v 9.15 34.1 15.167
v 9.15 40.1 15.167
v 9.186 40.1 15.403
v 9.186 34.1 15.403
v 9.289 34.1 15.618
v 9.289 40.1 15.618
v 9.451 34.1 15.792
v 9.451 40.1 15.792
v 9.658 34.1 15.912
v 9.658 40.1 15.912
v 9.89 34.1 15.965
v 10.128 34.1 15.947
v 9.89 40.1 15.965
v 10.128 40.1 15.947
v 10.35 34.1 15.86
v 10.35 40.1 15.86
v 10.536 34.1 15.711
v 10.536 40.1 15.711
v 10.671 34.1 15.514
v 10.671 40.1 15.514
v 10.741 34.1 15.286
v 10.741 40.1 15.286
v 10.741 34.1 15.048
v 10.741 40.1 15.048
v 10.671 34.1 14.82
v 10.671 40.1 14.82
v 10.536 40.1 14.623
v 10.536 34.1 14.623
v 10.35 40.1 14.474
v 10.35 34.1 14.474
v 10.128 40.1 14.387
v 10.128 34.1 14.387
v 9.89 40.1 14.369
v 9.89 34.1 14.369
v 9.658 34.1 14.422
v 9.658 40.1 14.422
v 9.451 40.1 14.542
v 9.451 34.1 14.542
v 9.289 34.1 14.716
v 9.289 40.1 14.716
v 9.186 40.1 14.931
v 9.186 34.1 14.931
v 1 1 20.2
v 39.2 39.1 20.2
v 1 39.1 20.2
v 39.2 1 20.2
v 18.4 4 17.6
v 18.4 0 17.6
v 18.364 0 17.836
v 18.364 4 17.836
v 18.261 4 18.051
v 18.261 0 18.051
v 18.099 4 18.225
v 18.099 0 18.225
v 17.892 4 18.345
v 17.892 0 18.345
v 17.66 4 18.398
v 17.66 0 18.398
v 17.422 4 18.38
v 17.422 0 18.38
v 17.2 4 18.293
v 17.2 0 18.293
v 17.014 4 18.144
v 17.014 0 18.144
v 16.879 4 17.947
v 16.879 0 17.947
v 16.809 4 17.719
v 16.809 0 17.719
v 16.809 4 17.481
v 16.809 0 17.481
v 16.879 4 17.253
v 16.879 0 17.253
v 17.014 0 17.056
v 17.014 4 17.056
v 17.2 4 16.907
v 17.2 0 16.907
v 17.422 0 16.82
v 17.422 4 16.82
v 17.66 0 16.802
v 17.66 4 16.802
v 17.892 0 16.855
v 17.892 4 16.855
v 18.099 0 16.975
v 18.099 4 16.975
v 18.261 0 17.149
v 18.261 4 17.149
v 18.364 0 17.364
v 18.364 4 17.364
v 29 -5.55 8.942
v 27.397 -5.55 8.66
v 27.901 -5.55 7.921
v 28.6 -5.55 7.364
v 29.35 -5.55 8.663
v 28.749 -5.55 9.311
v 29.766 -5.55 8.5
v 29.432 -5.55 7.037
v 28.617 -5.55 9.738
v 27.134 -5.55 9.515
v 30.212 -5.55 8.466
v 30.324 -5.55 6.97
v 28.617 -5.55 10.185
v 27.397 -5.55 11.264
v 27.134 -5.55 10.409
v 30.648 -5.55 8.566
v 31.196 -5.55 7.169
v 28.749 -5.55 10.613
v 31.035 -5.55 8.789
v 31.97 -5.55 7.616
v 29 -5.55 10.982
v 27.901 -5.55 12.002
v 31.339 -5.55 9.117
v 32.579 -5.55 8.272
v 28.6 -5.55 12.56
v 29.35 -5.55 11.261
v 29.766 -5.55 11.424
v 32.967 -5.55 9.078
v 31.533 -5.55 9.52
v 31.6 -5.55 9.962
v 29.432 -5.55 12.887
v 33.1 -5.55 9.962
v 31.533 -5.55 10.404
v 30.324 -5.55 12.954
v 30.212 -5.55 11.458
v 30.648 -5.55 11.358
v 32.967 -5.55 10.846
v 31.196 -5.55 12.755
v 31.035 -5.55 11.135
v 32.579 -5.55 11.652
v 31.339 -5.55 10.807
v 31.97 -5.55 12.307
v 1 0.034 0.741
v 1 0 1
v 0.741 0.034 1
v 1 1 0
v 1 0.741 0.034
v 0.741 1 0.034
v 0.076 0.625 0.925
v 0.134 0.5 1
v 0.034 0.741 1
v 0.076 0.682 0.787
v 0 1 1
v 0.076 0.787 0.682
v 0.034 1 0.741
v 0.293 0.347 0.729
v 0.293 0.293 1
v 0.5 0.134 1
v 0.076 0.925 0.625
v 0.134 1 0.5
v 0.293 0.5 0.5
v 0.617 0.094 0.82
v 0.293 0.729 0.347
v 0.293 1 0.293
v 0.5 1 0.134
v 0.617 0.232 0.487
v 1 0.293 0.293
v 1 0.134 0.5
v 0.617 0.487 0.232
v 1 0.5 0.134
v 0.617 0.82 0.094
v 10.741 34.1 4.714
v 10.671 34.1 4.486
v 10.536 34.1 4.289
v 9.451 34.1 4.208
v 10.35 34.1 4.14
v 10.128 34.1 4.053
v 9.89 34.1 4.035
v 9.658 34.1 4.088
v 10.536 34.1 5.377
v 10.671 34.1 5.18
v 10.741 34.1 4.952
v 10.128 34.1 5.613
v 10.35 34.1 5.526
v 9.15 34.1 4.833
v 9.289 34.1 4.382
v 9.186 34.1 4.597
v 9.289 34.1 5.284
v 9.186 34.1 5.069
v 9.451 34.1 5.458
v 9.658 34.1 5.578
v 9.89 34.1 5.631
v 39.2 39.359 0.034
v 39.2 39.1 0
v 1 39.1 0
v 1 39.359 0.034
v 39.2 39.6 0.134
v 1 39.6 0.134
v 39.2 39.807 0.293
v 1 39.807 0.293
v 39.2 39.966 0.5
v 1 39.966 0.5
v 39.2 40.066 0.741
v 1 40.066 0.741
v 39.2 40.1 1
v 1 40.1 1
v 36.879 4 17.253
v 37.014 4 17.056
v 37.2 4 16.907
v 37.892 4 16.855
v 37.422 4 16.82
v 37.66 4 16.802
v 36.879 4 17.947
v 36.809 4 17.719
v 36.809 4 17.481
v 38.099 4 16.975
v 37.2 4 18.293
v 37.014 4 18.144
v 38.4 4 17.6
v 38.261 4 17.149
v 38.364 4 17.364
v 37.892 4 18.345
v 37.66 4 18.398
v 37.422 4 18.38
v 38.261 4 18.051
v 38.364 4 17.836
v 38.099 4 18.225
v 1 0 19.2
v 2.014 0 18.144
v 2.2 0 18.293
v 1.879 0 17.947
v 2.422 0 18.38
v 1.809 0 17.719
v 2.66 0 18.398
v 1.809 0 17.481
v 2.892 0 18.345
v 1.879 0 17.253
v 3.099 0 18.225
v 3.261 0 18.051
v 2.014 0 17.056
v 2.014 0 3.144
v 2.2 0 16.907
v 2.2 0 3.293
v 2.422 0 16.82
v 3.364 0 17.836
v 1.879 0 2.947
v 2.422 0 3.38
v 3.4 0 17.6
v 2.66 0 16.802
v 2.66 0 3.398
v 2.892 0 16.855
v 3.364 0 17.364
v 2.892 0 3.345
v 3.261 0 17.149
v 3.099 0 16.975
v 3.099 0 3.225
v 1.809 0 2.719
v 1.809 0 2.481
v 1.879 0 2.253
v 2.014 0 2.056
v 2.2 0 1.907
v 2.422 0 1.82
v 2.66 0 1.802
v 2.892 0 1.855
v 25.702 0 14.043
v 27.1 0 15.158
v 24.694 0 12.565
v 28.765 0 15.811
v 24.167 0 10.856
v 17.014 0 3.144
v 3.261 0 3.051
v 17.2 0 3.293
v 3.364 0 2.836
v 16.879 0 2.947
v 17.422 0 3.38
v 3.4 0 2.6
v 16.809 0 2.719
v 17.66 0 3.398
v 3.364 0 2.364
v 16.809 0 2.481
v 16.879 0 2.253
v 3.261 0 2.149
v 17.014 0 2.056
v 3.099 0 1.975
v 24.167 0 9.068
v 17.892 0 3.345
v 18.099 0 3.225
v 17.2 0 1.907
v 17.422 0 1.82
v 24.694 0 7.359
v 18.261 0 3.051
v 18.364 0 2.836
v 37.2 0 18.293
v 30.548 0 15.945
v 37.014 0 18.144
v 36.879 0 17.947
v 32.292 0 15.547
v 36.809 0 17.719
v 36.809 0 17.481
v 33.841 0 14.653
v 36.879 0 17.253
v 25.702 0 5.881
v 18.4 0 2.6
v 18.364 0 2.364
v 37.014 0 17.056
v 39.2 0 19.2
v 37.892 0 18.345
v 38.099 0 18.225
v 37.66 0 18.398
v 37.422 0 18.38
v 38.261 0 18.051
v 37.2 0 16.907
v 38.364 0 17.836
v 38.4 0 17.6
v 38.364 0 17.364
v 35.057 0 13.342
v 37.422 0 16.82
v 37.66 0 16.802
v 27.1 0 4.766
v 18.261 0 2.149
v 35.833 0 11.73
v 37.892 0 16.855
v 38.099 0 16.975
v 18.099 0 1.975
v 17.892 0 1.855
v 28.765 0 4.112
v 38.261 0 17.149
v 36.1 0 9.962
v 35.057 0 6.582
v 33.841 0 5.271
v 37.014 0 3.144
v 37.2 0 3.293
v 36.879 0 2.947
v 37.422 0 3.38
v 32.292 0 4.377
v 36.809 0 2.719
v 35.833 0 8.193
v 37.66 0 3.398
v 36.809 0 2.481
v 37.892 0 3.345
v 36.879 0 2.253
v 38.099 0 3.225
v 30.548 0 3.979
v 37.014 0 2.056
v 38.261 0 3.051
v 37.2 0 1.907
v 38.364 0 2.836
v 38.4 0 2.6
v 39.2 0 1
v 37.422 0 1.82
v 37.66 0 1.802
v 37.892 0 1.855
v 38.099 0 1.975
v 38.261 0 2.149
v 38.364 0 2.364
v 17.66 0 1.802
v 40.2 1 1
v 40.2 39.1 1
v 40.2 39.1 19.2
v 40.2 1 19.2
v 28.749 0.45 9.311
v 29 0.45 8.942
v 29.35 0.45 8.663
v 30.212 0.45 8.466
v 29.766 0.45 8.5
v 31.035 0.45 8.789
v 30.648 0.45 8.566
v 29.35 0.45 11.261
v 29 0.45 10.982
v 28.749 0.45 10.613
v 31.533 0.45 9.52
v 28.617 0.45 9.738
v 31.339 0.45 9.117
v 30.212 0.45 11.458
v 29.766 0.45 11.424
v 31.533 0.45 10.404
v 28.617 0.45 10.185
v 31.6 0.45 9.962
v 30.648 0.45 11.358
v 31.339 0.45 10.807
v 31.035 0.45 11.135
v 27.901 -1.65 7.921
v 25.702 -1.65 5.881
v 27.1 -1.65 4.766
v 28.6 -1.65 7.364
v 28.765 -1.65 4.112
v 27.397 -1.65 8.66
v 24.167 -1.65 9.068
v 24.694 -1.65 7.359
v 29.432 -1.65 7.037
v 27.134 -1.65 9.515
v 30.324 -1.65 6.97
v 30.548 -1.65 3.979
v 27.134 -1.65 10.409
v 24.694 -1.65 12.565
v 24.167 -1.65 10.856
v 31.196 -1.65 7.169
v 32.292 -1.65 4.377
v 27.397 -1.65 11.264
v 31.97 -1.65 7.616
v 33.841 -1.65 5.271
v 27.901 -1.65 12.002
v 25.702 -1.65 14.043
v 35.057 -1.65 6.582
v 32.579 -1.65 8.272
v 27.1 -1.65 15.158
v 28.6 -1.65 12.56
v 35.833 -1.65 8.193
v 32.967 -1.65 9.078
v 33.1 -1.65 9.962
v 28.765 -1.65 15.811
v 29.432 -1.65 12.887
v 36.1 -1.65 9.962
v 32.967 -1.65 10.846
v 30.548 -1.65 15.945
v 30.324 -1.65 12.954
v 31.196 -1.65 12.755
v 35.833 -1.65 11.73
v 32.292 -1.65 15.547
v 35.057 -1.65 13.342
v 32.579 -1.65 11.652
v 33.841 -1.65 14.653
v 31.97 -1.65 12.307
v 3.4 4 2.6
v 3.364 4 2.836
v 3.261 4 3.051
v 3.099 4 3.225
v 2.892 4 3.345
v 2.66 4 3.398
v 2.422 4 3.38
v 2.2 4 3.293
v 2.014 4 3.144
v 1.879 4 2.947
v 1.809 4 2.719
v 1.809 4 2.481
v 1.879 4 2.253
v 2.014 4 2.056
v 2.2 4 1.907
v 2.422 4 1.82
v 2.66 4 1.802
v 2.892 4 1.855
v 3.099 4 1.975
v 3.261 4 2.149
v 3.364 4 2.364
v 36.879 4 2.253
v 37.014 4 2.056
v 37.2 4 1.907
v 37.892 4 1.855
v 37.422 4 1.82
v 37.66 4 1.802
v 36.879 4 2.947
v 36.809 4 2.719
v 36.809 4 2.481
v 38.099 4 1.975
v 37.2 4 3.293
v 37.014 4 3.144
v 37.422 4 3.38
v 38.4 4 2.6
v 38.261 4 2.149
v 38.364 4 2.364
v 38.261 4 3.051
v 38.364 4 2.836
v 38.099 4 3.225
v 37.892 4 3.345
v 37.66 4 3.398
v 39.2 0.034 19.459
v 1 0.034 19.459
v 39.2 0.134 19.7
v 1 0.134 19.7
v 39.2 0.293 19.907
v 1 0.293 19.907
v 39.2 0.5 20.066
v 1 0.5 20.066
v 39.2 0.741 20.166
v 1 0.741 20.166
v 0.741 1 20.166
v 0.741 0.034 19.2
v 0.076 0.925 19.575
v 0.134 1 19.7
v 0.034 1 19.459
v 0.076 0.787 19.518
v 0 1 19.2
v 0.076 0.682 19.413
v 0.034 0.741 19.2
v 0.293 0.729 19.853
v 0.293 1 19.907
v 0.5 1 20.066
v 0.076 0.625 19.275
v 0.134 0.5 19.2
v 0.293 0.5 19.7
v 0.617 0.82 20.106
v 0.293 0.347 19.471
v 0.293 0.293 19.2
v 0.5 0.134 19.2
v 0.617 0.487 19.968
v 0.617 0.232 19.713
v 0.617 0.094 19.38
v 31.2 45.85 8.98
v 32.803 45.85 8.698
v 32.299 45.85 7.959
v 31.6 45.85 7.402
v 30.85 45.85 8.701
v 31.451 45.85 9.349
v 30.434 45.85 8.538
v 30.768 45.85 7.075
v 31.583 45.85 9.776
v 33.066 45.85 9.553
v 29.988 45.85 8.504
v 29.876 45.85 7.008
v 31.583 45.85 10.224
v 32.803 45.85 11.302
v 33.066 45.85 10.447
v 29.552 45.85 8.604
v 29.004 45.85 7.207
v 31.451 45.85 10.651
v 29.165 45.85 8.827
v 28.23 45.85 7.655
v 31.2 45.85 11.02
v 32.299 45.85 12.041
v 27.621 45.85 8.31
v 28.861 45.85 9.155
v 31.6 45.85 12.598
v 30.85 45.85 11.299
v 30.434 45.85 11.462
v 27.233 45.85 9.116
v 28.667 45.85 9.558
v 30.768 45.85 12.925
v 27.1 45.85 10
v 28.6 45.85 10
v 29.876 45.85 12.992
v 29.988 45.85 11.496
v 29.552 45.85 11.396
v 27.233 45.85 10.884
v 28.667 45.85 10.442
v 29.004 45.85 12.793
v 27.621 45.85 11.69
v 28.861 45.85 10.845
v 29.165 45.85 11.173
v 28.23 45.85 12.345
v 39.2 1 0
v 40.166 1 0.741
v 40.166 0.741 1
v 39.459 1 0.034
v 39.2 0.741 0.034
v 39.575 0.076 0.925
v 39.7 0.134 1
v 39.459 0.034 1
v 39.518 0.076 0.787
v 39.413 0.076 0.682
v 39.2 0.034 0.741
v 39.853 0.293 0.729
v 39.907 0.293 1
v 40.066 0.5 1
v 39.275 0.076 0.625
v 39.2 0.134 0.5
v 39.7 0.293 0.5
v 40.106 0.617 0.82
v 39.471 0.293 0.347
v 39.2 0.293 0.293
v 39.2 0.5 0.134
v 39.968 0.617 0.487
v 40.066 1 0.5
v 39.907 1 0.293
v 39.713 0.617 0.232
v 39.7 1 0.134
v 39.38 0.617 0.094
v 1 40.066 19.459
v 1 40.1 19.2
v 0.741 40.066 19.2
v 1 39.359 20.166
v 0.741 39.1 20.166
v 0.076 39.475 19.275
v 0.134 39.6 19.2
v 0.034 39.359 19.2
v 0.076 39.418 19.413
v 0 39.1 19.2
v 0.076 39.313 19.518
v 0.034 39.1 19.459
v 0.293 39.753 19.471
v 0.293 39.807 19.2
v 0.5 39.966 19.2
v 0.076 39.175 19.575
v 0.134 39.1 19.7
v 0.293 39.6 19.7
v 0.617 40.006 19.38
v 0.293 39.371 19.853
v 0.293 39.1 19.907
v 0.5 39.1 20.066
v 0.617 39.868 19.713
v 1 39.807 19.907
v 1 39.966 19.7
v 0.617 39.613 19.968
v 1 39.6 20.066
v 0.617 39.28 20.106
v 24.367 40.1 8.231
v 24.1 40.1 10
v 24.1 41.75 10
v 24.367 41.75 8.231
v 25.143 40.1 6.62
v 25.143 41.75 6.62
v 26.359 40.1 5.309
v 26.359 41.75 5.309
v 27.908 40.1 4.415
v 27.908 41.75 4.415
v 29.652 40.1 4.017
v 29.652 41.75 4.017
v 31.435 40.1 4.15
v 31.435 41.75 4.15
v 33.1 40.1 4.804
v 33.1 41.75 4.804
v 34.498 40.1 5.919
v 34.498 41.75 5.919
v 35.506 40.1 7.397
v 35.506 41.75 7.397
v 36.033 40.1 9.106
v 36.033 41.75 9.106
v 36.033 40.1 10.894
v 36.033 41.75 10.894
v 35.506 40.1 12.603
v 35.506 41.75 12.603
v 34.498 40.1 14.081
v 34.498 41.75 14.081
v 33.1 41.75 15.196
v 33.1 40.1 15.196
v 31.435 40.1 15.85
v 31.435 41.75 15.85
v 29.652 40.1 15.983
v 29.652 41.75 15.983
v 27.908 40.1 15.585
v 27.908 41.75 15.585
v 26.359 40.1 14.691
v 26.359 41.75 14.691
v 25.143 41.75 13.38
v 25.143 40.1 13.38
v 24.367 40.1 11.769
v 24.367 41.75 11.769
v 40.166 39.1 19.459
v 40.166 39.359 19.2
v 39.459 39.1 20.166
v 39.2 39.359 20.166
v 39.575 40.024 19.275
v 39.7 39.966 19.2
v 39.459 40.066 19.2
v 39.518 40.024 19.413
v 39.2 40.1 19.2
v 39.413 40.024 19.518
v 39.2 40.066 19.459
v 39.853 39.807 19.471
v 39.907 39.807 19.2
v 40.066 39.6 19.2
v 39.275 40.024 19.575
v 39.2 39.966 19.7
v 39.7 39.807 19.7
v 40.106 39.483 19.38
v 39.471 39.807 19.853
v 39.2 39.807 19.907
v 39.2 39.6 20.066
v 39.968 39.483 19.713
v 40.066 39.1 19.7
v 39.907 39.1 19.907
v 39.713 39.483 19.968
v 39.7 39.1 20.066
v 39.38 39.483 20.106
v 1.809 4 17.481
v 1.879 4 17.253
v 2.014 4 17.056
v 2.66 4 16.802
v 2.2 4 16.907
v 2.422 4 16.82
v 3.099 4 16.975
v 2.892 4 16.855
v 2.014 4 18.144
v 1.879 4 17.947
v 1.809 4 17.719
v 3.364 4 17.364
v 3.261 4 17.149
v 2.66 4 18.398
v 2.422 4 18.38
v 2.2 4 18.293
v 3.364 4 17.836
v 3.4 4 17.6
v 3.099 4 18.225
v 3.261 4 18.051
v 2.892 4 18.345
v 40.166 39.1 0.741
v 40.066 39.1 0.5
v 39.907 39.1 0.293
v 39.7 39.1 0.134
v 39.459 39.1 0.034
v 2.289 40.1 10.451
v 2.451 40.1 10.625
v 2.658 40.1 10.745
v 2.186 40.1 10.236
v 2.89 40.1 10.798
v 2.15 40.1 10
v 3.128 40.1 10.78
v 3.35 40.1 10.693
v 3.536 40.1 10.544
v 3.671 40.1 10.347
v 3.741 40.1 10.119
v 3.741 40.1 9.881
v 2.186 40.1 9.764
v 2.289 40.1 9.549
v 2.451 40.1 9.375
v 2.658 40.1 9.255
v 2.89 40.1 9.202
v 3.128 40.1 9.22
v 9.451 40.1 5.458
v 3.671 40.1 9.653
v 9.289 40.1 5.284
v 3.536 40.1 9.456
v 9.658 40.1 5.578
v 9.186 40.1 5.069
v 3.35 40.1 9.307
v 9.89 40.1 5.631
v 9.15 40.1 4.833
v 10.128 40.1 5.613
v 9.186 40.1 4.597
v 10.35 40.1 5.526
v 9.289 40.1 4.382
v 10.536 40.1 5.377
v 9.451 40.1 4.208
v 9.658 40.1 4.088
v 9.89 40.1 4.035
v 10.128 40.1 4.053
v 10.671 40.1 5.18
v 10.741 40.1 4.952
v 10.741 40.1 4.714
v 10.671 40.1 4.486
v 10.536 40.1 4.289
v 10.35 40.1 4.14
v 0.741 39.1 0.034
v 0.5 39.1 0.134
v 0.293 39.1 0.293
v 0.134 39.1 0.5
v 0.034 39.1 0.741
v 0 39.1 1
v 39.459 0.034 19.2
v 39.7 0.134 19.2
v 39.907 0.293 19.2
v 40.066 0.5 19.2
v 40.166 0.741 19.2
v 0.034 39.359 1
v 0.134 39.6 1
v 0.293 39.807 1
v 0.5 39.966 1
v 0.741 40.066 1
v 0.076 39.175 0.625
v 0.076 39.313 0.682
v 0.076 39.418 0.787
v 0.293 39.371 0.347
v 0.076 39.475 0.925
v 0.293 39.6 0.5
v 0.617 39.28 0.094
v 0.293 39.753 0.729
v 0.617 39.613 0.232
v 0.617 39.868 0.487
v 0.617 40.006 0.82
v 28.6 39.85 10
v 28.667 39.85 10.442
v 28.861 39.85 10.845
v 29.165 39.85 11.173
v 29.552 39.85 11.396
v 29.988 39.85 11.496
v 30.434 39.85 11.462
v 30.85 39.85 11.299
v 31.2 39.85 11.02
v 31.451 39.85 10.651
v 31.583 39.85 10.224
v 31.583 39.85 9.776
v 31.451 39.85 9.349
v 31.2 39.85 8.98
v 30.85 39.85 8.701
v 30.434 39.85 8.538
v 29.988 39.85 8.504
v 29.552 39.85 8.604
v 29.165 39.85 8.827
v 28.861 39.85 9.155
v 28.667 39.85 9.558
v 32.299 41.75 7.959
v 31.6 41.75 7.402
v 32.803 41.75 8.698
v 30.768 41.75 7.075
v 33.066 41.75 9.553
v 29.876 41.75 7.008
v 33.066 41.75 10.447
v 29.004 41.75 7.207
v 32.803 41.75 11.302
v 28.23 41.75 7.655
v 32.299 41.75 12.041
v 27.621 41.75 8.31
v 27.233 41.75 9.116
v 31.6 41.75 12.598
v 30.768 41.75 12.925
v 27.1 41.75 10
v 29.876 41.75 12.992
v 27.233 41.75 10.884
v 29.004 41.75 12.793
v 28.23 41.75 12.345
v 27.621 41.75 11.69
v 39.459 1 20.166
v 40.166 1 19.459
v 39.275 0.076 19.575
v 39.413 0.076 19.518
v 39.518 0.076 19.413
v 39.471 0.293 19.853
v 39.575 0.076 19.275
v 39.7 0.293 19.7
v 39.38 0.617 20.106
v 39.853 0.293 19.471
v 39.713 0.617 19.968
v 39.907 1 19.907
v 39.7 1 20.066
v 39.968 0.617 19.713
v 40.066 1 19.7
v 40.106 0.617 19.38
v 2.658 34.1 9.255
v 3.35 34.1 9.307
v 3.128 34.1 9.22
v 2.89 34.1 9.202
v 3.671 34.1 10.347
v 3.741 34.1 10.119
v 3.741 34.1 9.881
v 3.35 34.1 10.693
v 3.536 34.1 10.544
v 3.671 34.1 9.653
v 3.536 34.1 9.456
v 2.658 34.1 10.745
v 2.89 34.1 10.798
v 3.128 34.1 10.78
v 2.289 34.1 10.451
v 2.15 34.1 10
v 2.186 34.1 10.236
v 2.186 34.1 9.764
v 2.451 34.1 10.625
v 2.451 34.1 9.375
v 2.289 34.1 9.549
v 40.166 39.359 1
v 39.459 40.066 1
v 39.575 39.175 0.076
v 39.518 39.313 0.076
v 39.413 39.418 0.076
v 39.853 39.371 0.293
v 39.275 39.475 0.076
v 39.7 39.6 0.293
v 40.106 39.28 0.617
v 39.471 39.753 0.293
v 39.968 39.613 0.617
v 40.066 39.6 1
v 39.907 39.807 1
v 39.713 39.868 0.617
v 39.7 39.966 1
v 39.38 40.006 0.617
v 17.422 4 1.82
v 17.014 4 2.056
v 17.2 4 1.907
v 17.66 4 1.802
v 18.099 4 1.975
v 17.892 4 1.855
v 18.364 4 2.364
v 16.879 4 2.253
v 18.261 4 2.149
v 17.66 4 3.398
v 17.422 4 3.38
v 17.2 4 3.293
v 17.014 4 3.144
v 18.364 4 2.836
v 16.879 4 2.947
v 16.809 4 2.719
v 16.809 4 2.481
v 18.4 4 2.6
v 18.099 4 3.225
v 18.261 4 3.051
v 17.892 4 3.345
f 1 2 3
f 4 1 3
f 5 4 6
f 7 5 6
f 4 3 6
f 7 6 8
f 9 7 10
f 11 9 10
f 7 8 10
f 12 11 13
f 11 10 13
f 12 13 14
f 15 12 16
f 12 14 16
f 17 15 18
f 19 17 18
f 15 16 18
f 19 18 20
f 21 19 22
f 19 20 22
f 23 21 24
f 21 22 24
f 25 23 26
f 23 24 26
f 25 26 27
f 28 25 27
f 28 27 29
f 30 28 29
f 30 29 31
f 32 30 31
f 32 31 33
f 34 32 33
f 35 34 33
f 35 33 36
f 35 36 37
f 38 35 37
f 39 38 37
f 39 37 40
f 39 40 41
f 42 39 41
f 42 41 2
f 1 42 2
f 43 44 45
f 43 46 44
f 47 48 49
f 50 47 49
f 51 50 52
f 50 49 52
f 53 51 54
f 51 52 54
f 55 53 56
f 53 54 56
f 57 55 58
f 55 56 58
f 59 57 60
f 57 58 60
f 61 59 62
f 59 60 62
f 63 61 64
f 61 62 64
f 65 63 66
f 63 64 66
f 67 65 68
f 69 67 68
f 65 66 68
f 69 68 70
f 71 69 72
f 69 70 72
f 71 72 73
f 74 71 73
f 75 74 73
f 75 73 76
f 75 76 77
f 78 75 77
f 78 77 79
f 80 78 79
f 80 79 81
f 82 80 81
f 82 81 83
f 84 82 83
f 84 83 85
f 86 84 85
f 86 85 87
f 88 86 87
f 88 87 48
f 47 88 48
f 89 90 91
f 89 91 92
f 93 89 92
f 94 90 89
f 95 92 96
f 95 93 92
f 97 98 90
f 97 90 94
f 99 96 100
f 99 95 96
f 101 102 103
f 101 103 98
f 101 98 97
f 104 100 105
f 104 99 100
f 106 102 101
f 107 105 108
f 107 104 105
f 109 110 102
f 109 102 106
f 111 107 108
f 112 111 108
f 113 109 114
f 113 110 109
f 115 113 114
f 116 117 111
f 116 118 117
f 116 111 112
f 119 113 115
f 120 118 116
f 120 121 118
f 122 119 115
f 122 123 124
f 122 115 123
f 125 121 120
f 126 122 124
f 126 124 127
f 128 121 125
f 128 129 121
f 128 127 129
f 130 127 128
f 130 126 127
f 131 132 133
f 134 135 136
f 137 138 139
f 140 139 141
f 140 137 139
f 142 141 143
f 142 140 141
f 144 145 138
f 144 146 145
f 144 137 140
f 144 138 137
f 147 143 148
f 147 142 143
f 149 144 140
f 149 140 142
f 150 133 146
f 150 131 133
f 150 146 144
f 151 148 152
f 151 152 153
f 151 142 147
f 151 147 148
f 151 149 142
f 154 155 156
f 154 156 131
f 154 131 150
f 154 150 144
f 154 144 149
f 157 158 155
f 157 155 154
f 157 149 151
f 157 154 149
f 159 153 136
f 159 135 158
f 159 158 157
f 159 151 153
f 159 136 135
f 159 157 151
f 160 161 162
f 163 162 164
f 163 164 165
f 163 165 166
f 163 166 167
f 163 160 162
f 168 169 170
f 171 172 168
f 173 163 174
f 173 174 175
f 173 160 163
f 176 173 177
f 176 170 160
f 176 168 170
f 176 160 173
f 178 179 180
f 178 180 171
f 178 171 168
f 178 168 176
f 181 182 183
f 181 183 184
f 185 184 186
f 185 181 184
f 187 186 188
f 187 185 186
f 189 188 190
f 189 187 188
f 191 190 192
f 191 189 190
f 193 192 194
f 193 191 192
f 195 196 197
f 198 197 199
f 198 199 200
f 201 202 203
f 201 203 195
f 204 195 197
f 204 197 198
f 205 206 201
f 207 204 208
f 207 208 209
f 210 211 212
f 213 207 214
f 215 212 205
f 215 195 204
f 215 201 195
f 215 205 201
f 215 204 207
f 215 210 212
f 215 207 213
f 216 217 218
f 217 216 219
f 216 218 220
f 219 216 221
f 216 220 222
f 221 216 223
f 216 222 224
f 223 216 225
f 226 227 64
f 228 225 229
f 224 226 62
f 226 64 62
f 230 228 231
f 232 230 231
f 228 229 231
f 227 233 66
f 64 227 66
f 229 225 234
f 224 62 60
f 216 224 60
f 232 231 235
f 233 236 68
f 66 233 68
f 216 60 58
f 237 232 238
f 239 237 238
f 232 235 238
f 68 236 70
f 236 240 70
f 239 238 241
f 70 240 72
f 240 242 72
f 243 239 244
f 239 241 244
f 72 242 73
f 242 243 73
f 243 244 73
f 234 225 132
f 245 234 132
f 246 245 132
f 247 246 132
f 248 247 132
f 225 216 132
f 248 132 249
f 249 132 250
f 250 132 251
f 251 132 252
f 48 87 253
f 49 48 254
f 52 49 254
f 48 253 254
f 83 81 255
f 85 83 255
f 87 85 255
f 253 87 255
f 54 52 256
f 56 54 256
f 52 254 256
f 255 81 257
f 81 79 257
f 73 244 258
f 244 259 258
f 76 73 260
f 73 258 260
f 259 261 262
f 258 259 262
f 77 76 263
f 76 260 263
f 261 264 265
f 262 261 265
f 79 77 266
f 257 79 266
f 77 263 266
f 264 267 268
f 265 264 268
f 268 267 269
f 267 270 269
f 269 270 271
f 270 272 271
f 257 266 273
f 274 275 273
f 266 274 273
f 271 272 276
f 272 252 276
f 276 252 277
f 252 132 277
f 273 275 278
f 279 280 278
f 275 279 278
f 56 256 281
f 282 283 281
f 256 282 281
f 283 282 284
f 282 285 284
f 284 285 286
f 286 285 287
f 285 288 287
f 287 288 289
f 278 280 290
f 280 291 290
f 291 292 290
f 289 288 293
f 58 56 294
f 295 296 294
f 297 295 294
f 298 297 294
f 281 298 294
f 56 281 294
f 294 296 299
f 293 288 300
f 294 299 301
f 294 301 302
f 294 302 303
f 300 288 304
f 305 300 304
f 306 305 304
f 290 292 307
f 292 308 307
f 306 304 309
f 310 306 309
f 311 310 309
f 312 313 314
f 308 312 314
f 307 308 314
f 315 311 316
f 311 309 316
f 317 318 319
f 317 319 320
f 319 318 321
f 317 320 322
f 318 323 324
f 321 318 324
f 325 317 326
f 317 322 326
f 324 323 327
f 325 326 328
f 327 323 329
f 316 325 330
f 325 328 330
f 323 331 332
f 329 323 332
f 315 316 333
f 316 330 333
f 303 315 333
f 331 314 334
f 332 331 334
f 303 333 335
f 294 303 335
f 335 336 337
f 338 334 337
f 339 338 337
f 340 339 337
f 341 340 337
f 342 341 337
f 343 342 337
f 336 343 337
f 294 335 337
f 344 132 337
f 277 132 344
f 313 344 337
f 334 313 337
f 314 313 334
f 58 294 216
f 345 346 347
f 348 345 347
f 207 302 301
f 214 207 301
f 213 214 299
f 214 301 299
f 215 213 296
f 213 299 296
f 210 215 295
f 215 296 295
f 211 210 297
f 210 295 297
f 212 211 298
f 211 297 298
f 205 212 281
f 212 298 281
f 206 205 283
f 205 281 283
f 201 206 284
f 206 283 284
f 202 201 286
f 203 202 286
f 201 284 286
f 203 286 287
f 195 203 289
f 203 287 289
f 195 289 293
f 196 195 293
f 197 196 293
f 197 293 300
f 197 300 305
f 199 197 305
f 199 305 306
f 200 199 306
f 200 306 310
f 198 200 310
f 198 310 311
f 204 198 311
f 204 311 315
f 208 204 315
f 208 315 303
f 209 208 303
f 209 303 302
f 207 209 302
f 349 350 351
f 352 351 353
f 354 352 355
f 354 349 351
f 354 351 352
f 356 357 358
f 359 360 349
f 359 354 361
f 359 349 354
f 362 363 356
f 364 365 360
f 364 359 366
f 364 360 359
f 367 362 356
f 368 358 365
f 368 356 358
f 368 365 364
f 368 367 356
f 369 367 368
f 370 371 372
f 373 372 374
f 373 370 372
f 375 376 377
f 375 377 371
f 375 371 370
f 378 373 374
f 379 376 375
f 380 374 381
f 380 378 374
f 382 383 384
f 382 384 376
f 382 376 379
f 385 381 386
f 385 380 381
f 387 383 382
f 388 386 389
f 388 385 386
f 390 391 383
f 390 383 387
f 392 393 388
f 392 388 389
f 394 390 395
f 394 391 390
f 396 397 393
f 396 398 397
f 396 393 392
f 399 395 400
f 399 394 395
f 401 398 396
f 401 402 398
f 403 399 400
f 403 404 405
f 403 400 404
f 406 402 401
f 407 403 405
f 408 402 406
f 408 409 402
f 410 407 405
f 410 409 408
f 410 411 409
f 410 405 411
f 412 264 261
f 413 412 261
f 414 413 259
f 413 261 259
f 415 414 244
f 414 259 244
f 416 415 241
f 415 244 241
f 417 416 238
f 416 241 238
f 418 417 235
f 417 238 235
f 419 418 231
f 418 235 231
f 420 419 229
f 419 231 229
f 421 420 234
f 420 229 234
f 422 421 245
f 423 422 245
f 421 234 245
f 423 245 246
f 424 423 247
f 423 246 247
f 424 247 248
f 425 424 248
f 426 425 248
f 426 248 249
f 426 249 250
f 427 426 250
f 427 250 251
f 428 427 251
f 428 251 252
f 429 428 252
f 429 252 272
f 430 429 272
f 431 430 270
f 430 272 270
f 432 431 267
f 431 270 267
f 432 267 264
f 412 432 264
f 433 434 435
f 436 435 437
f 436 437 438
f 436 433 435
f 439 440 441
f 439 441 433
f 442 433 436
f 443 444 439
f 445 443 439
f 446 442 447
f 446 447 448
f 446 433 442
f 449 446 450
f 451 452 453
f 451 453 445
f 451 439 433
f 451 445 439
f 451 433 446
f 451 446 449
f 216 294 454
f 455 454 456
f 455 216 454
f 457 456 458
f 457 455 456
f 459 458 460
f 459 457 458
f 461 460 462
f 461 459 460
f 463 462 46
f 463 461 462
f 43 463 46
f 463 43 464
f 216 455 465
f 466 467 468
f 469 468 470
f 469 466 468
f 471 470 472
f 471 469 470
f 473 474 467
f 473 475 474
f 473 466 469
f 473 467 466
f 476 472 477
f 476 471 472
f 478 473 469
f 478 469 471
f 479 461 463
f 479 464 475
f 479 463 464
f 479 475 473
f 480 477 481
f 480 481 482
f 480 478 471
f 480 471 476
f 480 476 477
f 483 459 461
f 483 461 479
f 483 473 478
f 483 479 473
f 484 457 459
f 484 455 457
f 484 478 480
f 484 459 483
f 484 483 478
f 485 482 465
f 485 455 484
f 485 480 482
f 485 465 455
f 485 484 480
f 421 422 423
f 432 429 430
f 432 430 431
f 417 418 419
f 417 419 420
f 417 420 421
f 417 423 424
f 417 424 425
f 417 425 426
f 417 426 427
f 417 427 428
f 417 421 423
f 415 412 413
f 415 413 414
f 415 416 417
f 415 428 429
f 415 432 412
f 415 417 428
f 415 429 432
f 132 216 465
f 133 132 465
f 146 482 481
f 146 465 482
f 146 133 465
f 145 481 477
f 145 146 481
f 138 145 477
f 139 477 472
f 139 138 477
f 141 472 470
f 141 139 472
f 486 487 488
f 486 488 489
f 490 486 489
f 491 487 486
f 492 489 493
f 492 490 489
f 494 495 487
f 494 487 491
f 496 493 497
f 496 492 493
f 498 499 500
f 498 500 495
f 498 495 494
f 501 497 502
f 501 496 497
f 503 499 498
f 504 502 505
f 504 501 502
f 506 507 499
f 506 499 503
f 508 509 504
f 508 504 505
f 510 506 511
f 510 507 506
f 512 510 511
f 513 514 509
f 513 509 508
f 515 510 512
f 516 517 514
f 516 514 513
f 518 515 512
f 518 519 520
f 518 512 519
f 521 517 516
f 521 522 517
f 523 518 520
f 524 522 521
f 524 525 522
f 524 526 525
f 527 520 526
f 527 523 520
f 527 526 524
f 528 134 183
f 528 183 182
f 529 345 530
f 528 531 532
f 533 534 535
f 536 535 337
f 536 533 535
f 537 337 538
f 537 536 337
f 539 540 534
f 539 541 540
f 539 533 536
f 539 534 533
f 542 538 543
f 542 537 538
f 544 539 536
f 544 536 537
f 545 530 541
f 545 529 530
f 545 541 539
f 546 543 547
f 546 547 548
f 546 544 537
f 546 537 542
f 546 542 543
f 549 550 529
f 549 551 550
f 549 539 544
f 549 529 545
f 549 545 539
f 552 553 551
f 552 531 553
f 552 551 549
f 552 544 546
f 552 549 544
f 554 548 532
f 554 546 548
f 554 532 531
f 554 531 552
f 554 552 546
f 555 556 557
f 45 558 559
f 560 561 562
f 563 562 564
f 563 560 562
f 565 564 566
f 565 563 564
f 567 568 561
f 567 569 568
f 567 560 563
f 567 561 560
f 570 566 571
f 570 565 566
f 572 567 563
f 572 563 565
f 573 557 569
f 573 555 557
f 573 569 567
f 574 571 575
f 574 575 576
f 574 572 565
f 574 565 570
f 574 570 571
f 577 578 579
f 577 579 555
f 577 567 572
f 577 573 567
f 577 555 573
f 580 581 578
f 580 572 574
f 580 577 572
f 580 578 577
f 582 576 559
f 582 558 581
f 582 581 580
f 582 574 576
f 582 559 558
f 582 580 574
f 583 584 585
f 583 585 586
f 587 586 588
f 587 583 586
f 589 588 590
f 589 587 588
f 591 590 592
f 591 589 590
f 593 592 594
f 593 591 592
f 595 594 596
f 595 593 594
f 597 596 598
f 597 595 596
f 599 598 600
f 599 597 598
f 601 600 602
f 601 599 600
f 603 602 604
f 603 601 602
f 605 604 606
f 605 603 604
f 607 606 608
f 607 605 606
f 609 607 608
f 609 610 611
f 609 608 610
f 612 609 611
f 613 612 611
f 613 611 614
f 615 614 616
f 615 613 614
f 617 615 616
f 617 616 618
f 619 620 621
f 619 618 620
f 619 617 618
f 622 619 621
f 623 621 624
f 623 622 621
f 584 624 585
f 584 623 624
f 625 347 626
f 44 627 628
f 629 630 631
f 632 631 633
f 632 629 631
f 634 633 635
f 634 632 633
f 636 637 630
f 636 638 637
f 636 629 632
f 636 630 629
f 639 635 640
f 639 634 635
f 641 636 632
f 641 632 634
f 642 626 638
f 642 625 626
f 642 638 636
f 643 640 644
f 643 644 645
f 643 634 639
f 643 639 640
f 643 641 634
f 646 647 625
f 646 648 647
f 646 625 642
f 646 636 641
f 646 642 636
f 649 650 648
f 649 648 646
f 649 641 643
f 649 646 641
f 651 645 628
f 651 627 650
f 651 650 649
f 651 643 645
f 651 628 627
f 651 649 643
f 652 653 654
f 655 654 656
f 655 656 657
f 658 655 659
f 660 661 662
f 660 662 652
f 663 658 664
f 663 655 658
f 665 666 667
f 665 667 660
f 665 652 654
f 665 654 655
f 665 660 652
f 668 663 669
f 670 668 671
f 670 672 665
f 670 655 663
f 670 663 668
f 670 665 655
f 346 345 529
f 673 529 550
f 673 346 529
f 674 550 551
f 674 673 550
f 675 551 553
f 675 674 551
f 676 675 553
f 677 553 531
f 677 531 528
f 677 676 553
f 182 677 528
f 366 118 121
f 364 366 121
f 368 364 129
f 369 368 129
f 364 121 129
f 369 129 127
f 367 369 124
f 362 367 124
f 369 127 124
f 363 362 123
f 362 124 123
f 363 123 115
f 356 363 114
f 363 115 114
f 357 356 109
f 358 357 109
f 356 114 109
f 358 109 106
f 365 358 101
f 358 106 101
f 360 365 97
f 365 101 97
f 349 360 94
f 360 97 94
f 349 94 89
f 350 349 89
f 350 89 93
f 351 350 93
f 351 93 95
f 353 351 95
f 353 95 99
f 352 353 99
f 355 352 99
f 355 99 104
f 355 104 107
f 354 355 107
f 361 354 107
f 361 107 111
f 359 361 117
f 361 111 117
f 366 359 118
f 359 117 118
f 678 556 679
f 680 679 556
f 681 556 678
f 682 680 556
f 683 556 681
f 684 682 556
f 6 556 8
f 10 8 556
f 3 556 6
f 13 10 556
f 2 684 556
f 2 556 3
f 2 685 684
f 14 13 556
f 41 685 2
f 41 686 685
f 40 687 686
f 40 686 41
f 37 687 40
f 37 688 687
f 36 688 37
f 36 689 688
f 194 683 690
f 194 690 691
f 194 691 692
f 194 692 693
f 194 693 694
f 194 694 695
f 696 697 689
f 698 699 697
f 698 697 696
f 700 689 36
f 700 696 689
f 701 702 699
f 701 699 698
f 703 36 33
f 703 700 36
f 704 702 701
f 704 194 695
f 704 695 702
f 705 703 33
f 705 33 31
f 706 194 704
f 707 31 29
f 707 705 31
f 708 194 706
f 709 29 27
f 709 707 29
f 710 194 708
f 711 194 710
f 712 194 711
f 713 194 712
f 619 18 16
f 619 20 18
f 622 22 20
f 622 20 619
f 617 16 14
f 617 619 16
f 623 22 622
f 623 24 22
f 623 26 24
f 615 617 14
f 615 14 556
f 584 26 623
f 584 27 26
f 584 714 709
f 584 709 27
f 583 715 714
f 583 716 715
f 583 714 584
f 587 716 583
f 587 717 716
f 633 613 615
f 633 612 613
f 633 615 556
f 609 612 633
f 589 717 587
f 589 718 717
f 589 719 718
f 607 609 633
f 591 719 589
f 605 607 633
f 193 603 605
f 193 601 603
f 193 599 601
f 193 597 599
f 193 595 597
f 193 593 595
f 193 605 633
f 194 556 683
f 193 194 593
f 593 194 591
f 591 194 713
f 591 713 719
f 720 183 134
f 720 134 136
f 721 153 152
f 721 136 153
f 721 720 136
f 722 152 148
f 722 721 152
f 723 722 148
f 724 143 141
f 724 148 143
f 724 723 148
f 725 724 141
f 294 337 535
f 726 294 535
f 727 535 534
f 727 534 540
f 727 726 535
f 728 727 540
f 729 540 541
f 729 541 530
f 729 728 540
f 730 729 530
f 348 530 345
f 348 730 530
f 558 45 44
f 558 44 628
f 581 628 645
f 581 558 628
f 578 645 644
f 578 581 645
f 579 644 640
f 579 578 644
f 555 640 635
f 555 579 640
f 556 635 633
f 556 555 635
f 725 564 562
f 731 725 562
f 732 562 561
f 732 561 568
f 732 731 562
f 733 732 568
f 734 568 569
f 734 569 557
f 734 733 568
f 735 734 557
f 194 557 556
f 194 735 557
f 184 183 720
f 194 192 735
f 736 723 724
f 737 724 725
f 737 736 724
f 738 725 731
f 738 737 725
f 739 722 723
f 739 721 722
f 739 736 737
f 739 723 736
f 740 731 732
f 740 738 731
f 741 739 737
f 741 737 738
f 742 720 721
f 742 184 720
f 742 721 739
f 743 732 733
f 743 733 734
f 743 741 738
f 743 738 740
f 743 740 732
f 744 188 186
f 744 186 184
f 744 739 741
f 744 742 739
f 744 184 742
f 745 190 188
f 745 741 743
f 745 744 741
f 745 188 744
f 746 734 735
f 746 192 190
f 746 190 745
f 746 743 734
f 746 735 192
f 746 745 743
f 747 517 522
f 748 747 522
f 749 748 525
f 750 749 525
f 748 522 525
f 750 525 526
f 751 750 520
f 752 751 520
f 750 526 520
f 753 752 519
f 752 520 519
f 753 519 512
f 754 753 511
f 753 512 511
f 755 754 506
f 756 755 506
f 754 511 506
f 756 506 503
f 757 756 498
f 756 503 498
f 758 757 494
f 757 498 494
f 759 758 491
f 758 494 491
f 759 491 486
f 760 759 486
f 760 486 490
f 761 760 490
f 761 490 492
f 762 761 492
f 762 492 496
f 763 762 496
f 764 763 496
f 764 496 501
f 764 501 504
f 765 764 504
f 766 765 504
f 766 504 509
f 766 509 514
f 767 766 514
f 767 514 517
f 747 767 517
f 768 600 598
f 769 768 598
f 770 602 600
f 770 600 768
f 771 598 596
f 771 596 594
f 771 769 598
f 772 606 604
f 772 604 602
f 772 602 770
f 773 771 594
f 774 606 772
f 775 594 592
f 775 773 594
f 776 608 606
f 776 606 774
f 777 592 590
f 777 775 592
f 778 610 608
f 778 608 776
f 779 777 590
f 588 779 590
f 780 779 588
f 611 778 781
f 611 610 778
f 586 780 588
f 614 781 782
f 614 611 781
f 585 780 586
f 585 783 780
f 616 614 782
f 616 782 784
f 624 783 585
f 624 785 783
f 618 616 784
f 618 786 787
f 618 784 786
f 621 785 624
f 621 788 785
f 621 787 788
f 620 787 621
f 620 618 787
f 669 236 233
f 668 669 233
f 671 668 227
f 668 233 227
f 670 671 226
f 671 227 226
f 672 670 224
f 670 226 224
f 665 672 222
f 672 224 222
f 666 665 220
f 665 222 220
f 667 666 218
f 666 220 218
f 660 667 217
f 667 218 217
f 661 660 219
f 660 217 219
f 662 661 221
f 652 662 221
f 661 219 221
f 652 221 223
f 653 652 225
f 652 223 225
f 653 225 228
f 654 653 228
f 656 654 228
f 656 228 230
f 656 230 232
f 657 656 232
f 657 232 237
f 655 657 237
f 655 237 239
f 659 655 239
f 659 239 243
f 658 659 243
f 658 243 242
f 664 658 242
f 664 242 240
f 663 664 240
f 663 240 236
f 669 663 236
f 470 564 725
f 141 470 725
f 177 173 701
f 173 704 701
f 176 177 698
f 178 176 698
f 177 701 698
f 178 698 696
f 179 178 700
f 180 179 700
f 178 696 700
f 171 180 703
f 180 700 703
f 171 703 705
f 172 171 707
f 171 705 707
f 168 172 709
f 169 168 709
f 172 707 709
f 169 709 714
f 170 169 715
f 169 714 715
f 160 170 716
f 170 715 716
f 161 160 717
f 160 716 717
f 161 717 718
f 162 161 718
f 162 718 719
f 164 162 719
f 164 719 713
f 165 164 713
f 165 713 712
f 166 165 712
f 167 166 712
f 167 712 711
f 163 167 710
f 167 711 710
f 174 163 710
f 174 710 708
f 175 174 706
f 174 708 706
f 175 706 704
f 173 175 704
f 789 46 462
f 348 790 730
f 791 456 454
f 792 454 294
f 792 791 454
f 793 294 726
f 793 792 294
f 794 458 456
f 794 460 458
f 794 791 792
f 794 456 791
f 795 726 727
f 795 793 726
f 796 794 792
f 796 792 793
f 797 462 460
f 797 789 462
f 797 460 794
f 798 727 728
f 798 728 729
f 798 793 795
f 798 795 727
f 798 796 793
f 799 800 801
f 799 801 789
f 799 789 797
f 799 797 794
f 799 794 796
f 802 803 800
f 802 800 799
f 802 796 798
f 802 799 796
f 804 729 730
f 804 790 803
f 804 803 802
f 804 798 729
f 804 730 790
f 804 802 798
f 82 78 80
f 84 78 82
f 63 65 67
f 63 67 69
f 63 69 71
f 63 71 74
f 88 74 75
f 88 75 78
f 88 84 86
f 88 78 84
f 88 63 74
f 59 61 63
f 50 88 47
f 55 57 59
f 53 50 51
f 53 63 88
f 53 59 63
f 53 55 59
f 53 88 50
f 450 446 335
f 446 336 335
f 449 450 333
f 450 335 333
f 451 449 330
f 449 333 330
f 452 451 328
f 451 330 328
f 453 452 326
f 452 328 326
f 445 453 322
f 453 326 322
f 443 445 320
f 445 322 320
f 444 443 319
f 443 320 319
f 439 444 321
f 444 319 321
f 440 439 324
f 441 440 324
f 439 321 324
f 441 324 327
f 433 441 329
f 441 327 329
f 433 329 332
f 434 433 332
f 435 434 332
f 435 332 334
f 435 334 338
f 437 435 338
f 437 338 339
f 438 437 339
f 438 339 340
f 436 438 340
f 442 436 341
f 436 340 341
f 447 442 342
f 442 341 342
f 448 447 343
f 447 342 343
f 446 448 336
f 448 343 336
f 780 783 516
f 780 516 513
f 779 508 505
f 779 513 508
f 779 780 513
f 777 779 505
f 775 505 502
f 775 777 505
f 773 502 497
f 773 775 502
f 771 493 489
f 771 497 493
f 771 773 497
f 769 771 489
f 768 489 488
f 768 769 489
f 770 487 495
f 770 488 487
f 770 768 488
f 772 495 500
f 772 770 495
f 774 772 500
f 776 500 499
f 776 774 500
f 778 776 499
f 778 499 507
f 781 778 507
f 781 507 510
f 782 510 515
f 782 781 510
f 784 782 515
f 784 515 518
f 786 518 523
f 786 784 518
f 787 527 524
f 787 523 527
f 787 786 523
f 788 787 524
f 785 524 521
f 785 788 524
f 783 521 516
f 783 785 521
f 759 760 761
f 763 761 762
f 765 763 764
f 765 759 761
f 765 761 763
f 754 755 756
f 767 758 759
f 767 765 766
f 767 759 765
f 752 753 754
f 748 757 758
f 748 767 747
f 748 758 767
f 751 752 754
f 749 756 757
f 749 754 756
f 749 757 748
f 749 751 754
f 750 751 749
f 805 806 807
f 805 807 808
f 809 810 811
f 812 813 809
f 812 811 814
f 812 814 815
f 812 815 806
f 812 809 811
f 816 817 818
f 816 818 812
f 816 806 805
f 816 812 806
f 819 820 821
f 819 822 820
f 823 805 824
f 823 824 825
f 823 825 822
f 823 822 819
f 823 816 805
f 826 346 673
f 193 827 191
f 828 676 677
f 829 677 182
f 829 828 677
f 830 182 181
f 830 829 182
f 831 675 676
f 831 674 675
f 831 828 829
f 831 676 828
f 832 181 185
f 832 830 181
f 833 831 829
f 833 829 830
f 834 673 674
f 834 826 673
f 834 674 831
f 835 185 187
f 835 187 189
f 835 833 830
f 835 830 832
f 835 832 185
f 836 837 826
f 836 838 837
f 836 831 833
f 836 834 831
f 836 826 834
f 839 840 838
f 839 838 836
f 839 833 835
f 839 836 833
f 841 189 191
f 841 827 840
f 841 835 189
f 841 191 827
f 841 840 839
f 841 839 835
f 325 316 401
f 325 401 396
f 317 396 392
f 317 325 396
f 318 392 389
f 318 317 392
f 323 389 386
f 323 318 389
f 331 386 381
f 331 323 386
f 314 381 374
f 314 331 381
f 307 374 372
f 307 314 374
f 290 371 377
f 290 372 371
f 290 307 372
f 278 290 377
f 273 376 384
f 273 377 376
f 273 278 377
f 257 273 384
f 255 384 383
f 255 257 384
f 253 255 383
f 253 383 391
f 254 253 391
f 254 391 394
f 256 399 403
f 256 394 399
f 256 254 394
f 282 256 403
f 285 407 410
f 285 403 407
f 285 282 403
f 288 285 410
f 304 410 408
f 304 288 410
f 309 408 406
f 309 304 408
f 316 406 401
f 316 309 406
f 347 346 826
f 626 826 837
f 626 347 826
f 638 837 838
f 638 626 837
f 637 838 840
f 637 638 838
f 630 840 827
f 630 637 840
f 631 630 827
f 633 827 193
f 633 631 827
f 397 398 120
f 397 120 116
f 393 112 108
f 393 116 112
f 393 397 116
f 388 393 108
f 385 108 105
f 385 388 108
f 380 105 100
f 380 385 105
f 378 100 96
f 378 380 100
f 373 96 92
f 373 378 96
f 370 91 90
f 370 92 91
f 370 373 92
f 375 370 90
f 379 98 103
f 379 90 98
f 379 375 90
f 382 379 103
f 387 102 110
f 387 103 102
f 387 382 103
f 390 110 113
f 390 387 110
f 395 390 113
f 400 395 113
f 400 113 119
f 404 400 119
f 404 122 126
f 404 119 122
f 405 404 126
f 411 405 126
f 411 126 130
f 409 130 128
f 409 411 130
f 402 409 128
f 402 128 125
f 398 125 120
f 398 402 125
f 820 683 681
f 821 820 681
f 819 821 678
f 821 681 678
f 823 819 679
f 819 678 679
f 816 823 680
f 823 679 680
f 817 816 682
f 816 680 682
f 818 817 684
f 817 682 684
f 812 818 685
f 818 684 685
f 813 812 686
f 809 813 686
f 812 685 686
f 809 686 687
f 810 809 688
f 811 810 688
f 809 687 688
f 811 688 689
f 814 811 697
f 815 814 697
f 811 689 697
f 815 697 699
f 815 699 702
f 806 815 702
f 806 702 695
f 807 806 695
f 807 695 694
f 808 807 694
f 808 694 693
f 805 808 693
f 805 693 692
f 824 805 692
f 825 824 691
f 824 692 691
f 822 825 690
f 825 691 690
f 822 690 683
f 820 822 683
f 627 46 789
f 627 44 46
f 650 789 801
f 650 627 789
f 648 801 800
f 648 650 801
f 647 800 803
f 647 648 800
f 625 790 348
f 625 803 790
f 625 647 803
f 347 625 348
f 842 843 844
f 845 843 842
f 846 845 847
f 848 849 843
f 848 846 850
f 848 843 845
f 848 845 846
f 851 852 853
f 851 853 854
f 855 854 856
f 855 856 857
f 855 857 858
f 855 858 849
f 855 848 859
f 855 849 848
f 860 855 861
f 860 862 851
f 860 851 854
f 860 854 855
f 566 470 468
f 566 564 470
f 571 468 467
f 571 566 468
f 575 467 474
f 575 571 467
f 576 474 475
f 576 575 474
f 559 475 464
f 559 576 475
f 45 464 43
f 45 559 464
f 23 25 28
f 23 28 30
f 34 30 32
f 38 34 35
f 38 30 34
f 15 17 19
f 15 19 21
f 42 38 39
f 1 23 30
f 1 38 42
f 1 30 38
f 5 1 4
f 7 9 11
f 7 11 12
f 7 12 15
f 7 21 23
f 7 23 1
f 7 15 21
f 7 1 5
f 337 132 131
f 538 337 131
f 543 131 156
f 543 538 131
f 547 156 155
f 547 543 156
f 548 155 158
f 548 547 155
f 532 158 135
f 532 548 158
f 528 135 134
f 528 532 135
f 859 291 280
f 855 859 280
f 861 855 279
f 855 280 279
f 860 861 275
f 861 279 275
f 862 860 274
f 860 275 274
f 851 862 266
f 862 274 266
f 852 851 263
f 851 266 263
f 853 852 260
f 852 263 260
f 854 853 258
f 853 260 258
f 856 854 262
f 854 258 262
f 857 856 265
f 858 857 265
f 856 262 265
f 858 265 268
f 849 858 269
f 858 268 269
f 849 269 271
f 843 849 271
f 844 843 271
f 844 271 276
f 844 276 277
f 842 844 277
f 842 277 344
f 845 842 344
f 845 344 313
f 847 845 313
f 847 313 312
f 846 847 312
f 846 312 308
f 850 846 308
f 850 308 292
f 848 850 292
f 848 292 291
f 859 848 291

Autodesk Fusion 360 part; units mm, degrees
sketch "草图1" plane through (0, 0, 0) normal (0, 1, 0) x (1, 0, 0)
  line L0 (0, 0) -> (40.2, 0)
  line L1 (40.2, 0) -> (40.2, -20.2)
  line L2 (40.2, -20.2) -> (0, -20.2)
  line L3 (0, -20.2) -> (0, 0)
  dimension "d1" = 20.2
  dimension "d2" = 40.2
extrude "拉伸1" add sketch "草图1" along normal blind 40.1 makes body 1
sketch "草图2" plane through (0, 0, 0) normal (0, -1, 0) x (1, 0, 0)
  line L0 (40.2, 20.2) -> (0, 20.2)
  line L1 (0, 20.2) -> (0, 0)
  line L2 (0, 0) -> (40.2, 0)
  line L3 (40.2, 0) -> (40.2, 20.2)
  line L4 (20.1, 23) -> (20.1, -21)
  line L5 (2.071, 10.1) -> (35, 10.1)
  circle A0 centre (2.6, 17.6) radius 0.8
  circle A1 centre (37.6, 17.6) radius 0.8
  circle A2 centre (2.6, 2.6) radius 0.8
  circle A3 centre (37.6, 2.6) radius 0.8
  circle A4 centre (17.6, 17.6) radius 0.8
  circle A5 centre (17.6, 2.6) radius 0.8
  dimension "d5" = 1.6
  dimension "d6" = 15
  dimension "d7" = 35
  dimension "d8" = 1.6
  dimension "d9" = 5
  dimension "d12" = 15
extrude "拉伸2" cut sketch "草图2" against normal blind 4 contours A0 | A1 | A2 | A3 | A4 | A5 bodies 1
sketch "草图3" plane through (0, 0, 0) normal (0, -1, 0) x (1, 0, 0)
  circle A0 centre (17.6, 2.6) radius 0.8
  circle A1 centre (2.6, 17.6) radius 0.8
  circle A2 centre (37.6, 17.6) radius 0.8
  circle A3 centre (17.6, 17.6) radius 0.8
  circle A4 centre (2.6, 2.6) radius 0.8
  circle A5 centre (37.6, 2.6) radius 0.8
  line L0 (40.2, 20.2) -> (0, 20.2)
  line L1 (0, 20.2) -> (0, 0)
  line L2 (0, 0) -> (40.2, 0)
  line L3 (40.2, 0) -> (40.2, 20.2)
  line L4 (20.1, 18.9238) -> (20.1, 1)
  circle A6 centre (30.1, 9.9619) radius 6
  dimension "d13" = 12
  dimension "d29" = 20
extrude "拉伸3" add sketch "草图3" along normal blind 1.65 contours A6 bodies 1
sketch "草图4" plane through (0, -1.65, 0) normal (0, -1, 0) x (1, 0, 0)
  circle A0 centre (30.1, 9.9619) radius 6
  circle A1 centre (30.1, 9.9619) radius 3
  dimension "d16" = 6
extrude "拉伸4" add sketch "草图4" along normal blind 3.9 contours A1 bodies 1
sketch "草图5" plane through (0, 40.1, 0) normal (0, 1, 0) x (-1, 0, 0)
  line L0 (0, 20.2) -> (-40.2, 20.2)
  line L1 (-40.2, 20.2) -> (-40.2, 0)
  line L2 (-40.2, 0) -> (0, 0)
  line L3 (0, 0) -> (0, 20.2)
  line L4 (-20.1, 1) -> (-20.1, 25)
  circle A0 centre (-30.1, 10) radius 6
  dimension "d19" = 12
  dimension "d20" = 20
extrude "拉伸5" add sketch "草图5" along normal blind 1.65 contours A0 bodies 1
sketch "草图6" plane through (0, 41.75, 0) normal (0, 1, 0) x (-1, 0, 0)
  circle A0 centre (-30.1, 10) radius 6
  circle A1 centre (-30.1, 10) radius 3
  dimension "d23" = 6
extrude "拉伸6" add sketch "草图6" along normal blind 4.1 contours A1 bodies 1
sketch "草图7" plane through (0, 45.85, 0) normal (0, 1, 0) x (-1, 0, 0)
  circle A0 centre (-30.1, 10) radius 3
  circle A1 centre (-30.1, 10) radius 1.5
  dimension "d26" = 3
extrude "拉伸7" cut sketch "草图7" against normal blind 6 contours A1 bodies 1
sketch "草图8" plane through (0, 40.1, 0) normal (0, 1, 0) x (-1, 0, 0)
  circle A0 centre (-30.1, 10) radius 6
  line L0 (0, 20.2) -> (-40.2, 20.2)
  line L1 (-40.2, 20.2) -> (-40.2, 0)
  line L2 (-40.2, 0) -> (0, 0)
  line L3 (0, 0) -> (0, 20.2)
  line L4 (-20.1, 25.0001) -> (-20.1, -10.3333)
  circle A1 centre (-2.95, 10) radius 0.8
  line L5 (-39, 10) -> (5, 10)
  circle A2 centre (-9.95, 15.167) radius 0.8
  circle A3 centre (-9.95, 4.833) radius 0.8
  dimension "d30" = 1.6
  dimension "d31" = 34.3
  dimension "d32" = 1.6
  dimension "d33" = 7
extrude "拉伸8" cut sketch "草图8" against normal blind 6 contours A1 L5 | A1 L5 | A2 | A3 bodies 1
fillet "圆角1" radius 1 12 edges at (40.2, 20.05, 20.2) (40.2, 40.1, 10.1) (40.2, 20.05, 0) (40.2, 0, 10.1) (20.1, 40.1, 0) (20.1, 40.1, 20.2) (20.1, 0, 20.2) (20.1, 0, 0) (0, 20.05, 20.2) (0, 40.1, 10.1) (0, 20.05, 0) (0, 0, 10.1) on bodies 1
sketch "草图9" plane through (0, -5.55, 0) normal (0, -1, 0) x (1, 0, 0)
  circle A0 centre (30.1, 9.9619) radius 3
  circle A1 centre (30.1, 9.9619) radius 1.5
  dimension "d38" = 3
extrude "拉伸9" cut sketch "草图9" against normal blind 6 contours A1 bodies 1
copy_body "实体->零部件1" bodies 1 removing the originals makes body 2 in component "Component'"
component "Component'" placed x (1, 0, 0) y (0, 1, 0) z (0, 0, 1) at (0, 0, 0)
